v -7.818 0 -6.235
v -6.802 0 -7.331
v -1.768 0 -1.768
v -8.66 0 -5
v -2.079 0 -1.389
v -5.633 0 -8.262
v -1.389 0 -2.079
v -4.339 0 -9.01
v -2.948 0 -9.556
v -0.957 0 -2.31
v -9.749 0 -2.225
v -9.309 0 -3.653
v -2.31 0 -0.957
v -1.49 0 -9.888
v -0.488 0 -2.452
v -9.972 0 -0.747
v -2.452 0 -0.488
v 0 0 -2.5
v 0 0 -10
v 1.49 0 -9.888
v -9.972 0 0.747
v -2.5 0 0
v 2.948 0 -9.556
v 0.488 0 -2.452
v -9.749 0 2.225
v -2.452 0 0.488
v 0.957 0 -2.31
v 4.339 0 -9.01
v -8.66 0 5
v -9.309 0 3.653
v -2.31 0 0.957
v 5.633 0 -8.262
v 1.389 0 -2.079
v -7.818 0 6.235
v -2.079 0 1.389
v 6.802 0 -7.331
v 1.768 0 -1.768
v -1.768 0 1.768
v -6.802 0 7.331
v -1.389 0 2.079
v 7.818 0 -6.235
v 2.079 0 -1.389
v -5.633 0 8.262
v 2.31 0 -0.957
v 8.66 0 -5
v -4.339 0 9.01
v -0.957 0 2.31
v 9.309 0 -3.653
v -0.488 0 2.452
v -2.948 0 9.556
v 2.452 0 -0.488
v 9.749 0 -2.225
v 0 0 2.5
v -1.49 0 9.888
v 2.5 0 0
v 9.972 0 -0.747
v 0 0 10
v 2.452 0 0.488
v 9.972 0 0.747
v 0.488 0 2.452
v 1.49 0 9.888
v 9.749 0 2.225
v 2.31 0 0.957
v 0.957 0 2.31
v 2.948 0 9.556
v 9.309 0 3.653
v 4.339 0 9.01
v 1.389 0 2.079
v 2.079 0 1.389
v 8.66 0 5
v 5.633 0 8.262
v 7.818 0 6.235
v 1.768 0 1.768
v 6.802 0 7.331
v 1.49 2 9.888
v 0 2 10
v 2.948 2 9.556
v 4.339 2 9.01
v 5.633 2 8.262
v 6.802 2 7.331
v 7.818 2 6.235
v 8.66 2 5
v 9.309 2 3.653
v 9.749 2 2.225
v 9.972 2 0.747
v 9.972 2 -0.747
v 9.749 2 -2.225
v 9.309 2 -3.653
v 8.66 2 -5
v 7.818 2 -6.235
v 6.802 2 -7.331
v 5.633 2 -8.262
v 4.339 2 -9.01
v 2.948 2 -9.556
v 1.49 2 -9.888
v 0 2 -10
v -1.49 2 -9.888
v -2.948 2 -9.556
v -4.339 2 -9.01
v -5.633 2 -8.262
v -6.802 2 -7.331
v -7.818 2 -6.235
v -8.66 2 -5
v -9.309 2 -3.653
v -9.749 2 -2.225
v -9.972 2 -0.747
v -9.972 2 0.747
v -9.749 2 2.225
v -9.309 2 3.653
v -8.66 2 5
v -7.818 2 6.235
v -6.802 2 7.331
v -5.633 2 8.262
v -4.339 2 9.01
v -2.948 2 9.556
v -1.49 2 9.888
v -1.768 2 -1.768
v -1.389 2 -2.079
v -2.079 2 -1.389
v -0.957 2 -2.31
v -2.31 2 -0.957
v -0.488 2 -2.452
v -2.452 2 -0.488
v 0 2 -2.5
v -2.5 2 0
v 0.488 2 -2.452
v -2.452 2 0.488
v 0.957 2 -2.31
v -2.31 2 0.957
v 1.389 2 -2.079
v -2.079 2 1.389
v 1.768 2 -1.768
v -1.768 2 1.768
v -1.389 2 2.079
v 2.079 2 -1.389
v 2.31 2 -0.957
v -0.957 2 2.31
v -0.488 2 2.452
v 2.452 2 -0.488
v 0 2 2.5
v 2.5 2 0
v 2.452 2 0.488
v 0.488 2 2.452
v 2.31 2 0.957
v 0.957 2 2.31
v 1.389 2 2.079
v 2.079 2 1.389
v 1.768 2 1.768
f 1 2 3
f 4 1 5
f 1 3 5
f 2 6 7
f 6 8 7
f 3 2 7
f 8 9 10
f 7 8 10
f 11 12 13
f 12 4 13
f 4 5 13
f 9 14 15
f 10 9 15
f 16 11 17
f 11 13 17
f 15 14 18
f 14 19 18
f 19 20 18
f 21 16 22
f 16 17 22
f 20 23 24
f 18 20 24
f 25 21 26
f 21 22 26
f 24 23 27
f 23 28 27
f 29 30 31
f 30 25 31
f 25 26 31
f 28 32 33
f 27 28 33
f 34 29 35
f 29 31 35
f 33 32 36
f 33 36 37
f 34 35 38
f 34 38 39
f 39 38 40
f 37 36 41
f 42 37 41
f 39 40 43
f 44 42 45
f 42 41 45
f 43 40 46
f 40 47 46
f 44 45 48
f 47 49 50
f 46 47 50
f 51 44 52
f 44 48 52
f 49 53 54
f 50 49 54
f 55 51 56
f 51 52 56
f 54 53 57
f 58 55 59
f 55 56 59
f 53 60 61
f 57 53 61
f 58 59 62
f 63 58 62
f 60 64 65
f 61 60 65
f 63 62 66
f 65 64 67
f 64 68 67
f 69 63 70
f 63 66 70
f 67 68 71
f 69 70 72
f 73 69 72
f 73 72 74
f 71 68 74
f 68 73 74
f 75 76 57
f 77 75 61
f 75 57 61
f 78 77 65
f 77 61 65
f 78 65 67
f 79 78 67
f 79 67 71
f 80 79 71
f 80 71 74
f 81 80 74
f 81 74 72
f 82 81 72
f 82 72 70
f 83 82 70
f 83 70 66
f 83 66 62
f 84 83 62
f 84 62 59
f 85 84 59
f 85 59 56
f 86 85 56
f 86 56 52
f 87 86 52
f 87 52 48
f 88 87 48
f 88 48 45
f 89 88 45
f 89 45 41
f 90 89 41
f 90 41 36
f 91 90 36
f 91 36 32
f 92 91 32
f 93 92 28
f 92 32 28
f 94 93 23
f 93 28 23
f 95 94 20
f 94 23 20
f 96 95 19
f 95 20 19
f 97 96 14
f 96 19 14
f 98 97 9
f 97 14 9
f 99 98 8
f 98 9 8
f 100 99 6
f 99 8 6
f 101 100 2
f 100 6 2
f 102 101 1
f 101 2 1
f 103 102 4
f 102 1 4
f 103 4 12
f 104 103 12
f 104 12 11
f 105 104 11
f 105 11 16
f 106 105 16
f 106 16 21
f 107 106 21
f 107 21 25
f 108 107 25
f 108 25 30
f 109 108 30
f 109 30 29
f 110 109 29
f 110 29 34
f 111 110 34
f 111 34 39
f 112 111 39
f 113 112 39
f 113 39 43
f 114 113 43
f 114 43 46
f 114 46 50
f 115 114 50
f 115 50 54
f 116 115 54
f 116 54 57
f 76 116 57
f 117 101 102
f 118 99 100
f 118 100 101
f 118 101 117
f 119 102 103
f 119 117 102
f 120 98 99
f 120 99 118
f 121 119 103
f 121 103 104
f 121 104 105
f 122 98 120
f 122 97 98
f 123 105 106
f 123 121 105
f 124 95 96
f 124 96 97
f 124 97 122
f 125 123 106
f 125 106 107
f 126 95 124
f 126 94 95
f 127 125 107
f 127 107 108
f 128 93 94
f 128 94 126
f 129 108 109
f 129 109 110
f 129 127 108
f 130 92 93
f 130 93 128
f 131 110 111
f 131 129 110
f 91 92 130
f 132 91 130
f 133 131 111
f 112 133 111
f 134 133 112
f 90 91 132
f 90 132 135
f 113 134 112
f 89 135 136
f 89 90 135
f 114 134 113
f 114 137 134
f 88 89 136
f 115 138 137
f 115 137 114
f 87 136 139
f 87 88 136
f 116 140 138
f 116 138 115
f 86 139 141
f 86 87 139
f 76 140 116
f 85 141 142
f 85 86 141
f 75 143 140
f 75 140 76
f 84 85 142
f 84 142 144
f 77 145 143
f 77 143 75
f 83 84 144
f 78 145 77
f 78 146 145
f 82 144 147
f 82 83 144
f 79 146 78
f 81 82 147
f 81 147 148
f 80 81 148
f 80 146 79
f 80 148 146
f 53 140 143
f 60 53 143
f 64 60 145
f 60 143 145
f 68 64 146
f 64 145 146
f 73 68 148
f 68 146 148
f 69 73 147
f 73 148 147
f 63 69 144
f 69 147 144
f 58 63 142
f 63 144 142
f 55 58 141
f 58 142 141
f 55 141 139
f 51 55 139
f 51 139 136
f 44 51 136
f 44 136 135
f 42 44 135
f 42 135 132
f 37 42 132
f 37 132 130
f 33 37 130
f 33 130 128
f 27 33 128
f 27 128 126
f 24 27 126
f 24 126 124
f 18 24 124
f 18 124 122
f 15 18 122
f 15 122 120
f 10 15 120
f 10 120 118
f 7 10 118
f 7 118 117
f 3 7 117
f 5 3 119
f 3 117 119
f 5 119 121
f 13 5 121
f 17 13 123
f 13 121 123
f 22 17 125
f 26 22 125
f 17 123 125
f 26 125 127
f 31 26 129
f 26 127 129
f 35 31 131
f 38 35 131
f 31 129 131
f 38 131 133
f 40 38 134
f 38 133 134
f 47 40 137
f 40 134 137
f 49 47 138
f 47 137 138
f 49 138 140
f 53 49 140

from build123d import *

# Parameters (mm, degrees)
SKETCH1_R           = 12.5
SKETCH1_R_2         = 2.125
BOSS_EXTRUDE1_DEPTH = 2
SKETCH2_R           = 2.5
CUT_EXTRUDE1_DEPTH  = 10
CUT_EXTRUDE2_START  = -10
SKETCH3_R           = 12.5
SKETCH3_R_2         = 10
CUT_EXTRUDE2_DEPTH  = 10


with BuildPart() as part:
    # Sketch1 → Boss-Extrude1 (new body)
    with BuildSketch(Plane(origin=(0, 0, 0), x_dir=(1, 0, 0), z_dir=(0, 1, 0))):
        with Locations(Location((0, 0, 0), (0, 0, 270))):
            Circle(SKETCH1_R)
        with Locations(Location((0, 0, 0), (0, 0, 270))):
            Circle(SKETCH1_R_2, mode=Mode.SUBTRACT)
    extrude(amount=BOSS_EXTRUDE1_DEPTH)

    # Sketch2 → Cut-Extrude1 (cut)
    with BuildSketch(Plane(origin=(0, 2, 0), x_dir=(1, 0, 0), z_dir=(0, 1, 0))):
        with Locations(Location((0, 0, 0), (0, 0, 270))):
            Circle(SKETCH2_R)
    extrude(amount=-CUT_EXTRUDE1_DEPTH, mode=Mode.SUBTRACT)

    # Sketch3 → Cut-Extrude2 (cut)
    with BuildSketch(Plane(origin=(0, 2, 0), x_dir=(1, 0, 0), z_dir=(0, 1, 0)).offset(CUT_EXTRUDE2_START)):
        Circle(SKETCH3_R)
        with Locations(Location((0, 0, 0), (0, 0, 270))):
            Circle(SKETCH3_R_2, mode=Mode.SUBTRACT)
    extrude(amount=CUT_EXTRUDE2_DEPTH, mode=Mode.SUBTRACT)


solid = part.part
